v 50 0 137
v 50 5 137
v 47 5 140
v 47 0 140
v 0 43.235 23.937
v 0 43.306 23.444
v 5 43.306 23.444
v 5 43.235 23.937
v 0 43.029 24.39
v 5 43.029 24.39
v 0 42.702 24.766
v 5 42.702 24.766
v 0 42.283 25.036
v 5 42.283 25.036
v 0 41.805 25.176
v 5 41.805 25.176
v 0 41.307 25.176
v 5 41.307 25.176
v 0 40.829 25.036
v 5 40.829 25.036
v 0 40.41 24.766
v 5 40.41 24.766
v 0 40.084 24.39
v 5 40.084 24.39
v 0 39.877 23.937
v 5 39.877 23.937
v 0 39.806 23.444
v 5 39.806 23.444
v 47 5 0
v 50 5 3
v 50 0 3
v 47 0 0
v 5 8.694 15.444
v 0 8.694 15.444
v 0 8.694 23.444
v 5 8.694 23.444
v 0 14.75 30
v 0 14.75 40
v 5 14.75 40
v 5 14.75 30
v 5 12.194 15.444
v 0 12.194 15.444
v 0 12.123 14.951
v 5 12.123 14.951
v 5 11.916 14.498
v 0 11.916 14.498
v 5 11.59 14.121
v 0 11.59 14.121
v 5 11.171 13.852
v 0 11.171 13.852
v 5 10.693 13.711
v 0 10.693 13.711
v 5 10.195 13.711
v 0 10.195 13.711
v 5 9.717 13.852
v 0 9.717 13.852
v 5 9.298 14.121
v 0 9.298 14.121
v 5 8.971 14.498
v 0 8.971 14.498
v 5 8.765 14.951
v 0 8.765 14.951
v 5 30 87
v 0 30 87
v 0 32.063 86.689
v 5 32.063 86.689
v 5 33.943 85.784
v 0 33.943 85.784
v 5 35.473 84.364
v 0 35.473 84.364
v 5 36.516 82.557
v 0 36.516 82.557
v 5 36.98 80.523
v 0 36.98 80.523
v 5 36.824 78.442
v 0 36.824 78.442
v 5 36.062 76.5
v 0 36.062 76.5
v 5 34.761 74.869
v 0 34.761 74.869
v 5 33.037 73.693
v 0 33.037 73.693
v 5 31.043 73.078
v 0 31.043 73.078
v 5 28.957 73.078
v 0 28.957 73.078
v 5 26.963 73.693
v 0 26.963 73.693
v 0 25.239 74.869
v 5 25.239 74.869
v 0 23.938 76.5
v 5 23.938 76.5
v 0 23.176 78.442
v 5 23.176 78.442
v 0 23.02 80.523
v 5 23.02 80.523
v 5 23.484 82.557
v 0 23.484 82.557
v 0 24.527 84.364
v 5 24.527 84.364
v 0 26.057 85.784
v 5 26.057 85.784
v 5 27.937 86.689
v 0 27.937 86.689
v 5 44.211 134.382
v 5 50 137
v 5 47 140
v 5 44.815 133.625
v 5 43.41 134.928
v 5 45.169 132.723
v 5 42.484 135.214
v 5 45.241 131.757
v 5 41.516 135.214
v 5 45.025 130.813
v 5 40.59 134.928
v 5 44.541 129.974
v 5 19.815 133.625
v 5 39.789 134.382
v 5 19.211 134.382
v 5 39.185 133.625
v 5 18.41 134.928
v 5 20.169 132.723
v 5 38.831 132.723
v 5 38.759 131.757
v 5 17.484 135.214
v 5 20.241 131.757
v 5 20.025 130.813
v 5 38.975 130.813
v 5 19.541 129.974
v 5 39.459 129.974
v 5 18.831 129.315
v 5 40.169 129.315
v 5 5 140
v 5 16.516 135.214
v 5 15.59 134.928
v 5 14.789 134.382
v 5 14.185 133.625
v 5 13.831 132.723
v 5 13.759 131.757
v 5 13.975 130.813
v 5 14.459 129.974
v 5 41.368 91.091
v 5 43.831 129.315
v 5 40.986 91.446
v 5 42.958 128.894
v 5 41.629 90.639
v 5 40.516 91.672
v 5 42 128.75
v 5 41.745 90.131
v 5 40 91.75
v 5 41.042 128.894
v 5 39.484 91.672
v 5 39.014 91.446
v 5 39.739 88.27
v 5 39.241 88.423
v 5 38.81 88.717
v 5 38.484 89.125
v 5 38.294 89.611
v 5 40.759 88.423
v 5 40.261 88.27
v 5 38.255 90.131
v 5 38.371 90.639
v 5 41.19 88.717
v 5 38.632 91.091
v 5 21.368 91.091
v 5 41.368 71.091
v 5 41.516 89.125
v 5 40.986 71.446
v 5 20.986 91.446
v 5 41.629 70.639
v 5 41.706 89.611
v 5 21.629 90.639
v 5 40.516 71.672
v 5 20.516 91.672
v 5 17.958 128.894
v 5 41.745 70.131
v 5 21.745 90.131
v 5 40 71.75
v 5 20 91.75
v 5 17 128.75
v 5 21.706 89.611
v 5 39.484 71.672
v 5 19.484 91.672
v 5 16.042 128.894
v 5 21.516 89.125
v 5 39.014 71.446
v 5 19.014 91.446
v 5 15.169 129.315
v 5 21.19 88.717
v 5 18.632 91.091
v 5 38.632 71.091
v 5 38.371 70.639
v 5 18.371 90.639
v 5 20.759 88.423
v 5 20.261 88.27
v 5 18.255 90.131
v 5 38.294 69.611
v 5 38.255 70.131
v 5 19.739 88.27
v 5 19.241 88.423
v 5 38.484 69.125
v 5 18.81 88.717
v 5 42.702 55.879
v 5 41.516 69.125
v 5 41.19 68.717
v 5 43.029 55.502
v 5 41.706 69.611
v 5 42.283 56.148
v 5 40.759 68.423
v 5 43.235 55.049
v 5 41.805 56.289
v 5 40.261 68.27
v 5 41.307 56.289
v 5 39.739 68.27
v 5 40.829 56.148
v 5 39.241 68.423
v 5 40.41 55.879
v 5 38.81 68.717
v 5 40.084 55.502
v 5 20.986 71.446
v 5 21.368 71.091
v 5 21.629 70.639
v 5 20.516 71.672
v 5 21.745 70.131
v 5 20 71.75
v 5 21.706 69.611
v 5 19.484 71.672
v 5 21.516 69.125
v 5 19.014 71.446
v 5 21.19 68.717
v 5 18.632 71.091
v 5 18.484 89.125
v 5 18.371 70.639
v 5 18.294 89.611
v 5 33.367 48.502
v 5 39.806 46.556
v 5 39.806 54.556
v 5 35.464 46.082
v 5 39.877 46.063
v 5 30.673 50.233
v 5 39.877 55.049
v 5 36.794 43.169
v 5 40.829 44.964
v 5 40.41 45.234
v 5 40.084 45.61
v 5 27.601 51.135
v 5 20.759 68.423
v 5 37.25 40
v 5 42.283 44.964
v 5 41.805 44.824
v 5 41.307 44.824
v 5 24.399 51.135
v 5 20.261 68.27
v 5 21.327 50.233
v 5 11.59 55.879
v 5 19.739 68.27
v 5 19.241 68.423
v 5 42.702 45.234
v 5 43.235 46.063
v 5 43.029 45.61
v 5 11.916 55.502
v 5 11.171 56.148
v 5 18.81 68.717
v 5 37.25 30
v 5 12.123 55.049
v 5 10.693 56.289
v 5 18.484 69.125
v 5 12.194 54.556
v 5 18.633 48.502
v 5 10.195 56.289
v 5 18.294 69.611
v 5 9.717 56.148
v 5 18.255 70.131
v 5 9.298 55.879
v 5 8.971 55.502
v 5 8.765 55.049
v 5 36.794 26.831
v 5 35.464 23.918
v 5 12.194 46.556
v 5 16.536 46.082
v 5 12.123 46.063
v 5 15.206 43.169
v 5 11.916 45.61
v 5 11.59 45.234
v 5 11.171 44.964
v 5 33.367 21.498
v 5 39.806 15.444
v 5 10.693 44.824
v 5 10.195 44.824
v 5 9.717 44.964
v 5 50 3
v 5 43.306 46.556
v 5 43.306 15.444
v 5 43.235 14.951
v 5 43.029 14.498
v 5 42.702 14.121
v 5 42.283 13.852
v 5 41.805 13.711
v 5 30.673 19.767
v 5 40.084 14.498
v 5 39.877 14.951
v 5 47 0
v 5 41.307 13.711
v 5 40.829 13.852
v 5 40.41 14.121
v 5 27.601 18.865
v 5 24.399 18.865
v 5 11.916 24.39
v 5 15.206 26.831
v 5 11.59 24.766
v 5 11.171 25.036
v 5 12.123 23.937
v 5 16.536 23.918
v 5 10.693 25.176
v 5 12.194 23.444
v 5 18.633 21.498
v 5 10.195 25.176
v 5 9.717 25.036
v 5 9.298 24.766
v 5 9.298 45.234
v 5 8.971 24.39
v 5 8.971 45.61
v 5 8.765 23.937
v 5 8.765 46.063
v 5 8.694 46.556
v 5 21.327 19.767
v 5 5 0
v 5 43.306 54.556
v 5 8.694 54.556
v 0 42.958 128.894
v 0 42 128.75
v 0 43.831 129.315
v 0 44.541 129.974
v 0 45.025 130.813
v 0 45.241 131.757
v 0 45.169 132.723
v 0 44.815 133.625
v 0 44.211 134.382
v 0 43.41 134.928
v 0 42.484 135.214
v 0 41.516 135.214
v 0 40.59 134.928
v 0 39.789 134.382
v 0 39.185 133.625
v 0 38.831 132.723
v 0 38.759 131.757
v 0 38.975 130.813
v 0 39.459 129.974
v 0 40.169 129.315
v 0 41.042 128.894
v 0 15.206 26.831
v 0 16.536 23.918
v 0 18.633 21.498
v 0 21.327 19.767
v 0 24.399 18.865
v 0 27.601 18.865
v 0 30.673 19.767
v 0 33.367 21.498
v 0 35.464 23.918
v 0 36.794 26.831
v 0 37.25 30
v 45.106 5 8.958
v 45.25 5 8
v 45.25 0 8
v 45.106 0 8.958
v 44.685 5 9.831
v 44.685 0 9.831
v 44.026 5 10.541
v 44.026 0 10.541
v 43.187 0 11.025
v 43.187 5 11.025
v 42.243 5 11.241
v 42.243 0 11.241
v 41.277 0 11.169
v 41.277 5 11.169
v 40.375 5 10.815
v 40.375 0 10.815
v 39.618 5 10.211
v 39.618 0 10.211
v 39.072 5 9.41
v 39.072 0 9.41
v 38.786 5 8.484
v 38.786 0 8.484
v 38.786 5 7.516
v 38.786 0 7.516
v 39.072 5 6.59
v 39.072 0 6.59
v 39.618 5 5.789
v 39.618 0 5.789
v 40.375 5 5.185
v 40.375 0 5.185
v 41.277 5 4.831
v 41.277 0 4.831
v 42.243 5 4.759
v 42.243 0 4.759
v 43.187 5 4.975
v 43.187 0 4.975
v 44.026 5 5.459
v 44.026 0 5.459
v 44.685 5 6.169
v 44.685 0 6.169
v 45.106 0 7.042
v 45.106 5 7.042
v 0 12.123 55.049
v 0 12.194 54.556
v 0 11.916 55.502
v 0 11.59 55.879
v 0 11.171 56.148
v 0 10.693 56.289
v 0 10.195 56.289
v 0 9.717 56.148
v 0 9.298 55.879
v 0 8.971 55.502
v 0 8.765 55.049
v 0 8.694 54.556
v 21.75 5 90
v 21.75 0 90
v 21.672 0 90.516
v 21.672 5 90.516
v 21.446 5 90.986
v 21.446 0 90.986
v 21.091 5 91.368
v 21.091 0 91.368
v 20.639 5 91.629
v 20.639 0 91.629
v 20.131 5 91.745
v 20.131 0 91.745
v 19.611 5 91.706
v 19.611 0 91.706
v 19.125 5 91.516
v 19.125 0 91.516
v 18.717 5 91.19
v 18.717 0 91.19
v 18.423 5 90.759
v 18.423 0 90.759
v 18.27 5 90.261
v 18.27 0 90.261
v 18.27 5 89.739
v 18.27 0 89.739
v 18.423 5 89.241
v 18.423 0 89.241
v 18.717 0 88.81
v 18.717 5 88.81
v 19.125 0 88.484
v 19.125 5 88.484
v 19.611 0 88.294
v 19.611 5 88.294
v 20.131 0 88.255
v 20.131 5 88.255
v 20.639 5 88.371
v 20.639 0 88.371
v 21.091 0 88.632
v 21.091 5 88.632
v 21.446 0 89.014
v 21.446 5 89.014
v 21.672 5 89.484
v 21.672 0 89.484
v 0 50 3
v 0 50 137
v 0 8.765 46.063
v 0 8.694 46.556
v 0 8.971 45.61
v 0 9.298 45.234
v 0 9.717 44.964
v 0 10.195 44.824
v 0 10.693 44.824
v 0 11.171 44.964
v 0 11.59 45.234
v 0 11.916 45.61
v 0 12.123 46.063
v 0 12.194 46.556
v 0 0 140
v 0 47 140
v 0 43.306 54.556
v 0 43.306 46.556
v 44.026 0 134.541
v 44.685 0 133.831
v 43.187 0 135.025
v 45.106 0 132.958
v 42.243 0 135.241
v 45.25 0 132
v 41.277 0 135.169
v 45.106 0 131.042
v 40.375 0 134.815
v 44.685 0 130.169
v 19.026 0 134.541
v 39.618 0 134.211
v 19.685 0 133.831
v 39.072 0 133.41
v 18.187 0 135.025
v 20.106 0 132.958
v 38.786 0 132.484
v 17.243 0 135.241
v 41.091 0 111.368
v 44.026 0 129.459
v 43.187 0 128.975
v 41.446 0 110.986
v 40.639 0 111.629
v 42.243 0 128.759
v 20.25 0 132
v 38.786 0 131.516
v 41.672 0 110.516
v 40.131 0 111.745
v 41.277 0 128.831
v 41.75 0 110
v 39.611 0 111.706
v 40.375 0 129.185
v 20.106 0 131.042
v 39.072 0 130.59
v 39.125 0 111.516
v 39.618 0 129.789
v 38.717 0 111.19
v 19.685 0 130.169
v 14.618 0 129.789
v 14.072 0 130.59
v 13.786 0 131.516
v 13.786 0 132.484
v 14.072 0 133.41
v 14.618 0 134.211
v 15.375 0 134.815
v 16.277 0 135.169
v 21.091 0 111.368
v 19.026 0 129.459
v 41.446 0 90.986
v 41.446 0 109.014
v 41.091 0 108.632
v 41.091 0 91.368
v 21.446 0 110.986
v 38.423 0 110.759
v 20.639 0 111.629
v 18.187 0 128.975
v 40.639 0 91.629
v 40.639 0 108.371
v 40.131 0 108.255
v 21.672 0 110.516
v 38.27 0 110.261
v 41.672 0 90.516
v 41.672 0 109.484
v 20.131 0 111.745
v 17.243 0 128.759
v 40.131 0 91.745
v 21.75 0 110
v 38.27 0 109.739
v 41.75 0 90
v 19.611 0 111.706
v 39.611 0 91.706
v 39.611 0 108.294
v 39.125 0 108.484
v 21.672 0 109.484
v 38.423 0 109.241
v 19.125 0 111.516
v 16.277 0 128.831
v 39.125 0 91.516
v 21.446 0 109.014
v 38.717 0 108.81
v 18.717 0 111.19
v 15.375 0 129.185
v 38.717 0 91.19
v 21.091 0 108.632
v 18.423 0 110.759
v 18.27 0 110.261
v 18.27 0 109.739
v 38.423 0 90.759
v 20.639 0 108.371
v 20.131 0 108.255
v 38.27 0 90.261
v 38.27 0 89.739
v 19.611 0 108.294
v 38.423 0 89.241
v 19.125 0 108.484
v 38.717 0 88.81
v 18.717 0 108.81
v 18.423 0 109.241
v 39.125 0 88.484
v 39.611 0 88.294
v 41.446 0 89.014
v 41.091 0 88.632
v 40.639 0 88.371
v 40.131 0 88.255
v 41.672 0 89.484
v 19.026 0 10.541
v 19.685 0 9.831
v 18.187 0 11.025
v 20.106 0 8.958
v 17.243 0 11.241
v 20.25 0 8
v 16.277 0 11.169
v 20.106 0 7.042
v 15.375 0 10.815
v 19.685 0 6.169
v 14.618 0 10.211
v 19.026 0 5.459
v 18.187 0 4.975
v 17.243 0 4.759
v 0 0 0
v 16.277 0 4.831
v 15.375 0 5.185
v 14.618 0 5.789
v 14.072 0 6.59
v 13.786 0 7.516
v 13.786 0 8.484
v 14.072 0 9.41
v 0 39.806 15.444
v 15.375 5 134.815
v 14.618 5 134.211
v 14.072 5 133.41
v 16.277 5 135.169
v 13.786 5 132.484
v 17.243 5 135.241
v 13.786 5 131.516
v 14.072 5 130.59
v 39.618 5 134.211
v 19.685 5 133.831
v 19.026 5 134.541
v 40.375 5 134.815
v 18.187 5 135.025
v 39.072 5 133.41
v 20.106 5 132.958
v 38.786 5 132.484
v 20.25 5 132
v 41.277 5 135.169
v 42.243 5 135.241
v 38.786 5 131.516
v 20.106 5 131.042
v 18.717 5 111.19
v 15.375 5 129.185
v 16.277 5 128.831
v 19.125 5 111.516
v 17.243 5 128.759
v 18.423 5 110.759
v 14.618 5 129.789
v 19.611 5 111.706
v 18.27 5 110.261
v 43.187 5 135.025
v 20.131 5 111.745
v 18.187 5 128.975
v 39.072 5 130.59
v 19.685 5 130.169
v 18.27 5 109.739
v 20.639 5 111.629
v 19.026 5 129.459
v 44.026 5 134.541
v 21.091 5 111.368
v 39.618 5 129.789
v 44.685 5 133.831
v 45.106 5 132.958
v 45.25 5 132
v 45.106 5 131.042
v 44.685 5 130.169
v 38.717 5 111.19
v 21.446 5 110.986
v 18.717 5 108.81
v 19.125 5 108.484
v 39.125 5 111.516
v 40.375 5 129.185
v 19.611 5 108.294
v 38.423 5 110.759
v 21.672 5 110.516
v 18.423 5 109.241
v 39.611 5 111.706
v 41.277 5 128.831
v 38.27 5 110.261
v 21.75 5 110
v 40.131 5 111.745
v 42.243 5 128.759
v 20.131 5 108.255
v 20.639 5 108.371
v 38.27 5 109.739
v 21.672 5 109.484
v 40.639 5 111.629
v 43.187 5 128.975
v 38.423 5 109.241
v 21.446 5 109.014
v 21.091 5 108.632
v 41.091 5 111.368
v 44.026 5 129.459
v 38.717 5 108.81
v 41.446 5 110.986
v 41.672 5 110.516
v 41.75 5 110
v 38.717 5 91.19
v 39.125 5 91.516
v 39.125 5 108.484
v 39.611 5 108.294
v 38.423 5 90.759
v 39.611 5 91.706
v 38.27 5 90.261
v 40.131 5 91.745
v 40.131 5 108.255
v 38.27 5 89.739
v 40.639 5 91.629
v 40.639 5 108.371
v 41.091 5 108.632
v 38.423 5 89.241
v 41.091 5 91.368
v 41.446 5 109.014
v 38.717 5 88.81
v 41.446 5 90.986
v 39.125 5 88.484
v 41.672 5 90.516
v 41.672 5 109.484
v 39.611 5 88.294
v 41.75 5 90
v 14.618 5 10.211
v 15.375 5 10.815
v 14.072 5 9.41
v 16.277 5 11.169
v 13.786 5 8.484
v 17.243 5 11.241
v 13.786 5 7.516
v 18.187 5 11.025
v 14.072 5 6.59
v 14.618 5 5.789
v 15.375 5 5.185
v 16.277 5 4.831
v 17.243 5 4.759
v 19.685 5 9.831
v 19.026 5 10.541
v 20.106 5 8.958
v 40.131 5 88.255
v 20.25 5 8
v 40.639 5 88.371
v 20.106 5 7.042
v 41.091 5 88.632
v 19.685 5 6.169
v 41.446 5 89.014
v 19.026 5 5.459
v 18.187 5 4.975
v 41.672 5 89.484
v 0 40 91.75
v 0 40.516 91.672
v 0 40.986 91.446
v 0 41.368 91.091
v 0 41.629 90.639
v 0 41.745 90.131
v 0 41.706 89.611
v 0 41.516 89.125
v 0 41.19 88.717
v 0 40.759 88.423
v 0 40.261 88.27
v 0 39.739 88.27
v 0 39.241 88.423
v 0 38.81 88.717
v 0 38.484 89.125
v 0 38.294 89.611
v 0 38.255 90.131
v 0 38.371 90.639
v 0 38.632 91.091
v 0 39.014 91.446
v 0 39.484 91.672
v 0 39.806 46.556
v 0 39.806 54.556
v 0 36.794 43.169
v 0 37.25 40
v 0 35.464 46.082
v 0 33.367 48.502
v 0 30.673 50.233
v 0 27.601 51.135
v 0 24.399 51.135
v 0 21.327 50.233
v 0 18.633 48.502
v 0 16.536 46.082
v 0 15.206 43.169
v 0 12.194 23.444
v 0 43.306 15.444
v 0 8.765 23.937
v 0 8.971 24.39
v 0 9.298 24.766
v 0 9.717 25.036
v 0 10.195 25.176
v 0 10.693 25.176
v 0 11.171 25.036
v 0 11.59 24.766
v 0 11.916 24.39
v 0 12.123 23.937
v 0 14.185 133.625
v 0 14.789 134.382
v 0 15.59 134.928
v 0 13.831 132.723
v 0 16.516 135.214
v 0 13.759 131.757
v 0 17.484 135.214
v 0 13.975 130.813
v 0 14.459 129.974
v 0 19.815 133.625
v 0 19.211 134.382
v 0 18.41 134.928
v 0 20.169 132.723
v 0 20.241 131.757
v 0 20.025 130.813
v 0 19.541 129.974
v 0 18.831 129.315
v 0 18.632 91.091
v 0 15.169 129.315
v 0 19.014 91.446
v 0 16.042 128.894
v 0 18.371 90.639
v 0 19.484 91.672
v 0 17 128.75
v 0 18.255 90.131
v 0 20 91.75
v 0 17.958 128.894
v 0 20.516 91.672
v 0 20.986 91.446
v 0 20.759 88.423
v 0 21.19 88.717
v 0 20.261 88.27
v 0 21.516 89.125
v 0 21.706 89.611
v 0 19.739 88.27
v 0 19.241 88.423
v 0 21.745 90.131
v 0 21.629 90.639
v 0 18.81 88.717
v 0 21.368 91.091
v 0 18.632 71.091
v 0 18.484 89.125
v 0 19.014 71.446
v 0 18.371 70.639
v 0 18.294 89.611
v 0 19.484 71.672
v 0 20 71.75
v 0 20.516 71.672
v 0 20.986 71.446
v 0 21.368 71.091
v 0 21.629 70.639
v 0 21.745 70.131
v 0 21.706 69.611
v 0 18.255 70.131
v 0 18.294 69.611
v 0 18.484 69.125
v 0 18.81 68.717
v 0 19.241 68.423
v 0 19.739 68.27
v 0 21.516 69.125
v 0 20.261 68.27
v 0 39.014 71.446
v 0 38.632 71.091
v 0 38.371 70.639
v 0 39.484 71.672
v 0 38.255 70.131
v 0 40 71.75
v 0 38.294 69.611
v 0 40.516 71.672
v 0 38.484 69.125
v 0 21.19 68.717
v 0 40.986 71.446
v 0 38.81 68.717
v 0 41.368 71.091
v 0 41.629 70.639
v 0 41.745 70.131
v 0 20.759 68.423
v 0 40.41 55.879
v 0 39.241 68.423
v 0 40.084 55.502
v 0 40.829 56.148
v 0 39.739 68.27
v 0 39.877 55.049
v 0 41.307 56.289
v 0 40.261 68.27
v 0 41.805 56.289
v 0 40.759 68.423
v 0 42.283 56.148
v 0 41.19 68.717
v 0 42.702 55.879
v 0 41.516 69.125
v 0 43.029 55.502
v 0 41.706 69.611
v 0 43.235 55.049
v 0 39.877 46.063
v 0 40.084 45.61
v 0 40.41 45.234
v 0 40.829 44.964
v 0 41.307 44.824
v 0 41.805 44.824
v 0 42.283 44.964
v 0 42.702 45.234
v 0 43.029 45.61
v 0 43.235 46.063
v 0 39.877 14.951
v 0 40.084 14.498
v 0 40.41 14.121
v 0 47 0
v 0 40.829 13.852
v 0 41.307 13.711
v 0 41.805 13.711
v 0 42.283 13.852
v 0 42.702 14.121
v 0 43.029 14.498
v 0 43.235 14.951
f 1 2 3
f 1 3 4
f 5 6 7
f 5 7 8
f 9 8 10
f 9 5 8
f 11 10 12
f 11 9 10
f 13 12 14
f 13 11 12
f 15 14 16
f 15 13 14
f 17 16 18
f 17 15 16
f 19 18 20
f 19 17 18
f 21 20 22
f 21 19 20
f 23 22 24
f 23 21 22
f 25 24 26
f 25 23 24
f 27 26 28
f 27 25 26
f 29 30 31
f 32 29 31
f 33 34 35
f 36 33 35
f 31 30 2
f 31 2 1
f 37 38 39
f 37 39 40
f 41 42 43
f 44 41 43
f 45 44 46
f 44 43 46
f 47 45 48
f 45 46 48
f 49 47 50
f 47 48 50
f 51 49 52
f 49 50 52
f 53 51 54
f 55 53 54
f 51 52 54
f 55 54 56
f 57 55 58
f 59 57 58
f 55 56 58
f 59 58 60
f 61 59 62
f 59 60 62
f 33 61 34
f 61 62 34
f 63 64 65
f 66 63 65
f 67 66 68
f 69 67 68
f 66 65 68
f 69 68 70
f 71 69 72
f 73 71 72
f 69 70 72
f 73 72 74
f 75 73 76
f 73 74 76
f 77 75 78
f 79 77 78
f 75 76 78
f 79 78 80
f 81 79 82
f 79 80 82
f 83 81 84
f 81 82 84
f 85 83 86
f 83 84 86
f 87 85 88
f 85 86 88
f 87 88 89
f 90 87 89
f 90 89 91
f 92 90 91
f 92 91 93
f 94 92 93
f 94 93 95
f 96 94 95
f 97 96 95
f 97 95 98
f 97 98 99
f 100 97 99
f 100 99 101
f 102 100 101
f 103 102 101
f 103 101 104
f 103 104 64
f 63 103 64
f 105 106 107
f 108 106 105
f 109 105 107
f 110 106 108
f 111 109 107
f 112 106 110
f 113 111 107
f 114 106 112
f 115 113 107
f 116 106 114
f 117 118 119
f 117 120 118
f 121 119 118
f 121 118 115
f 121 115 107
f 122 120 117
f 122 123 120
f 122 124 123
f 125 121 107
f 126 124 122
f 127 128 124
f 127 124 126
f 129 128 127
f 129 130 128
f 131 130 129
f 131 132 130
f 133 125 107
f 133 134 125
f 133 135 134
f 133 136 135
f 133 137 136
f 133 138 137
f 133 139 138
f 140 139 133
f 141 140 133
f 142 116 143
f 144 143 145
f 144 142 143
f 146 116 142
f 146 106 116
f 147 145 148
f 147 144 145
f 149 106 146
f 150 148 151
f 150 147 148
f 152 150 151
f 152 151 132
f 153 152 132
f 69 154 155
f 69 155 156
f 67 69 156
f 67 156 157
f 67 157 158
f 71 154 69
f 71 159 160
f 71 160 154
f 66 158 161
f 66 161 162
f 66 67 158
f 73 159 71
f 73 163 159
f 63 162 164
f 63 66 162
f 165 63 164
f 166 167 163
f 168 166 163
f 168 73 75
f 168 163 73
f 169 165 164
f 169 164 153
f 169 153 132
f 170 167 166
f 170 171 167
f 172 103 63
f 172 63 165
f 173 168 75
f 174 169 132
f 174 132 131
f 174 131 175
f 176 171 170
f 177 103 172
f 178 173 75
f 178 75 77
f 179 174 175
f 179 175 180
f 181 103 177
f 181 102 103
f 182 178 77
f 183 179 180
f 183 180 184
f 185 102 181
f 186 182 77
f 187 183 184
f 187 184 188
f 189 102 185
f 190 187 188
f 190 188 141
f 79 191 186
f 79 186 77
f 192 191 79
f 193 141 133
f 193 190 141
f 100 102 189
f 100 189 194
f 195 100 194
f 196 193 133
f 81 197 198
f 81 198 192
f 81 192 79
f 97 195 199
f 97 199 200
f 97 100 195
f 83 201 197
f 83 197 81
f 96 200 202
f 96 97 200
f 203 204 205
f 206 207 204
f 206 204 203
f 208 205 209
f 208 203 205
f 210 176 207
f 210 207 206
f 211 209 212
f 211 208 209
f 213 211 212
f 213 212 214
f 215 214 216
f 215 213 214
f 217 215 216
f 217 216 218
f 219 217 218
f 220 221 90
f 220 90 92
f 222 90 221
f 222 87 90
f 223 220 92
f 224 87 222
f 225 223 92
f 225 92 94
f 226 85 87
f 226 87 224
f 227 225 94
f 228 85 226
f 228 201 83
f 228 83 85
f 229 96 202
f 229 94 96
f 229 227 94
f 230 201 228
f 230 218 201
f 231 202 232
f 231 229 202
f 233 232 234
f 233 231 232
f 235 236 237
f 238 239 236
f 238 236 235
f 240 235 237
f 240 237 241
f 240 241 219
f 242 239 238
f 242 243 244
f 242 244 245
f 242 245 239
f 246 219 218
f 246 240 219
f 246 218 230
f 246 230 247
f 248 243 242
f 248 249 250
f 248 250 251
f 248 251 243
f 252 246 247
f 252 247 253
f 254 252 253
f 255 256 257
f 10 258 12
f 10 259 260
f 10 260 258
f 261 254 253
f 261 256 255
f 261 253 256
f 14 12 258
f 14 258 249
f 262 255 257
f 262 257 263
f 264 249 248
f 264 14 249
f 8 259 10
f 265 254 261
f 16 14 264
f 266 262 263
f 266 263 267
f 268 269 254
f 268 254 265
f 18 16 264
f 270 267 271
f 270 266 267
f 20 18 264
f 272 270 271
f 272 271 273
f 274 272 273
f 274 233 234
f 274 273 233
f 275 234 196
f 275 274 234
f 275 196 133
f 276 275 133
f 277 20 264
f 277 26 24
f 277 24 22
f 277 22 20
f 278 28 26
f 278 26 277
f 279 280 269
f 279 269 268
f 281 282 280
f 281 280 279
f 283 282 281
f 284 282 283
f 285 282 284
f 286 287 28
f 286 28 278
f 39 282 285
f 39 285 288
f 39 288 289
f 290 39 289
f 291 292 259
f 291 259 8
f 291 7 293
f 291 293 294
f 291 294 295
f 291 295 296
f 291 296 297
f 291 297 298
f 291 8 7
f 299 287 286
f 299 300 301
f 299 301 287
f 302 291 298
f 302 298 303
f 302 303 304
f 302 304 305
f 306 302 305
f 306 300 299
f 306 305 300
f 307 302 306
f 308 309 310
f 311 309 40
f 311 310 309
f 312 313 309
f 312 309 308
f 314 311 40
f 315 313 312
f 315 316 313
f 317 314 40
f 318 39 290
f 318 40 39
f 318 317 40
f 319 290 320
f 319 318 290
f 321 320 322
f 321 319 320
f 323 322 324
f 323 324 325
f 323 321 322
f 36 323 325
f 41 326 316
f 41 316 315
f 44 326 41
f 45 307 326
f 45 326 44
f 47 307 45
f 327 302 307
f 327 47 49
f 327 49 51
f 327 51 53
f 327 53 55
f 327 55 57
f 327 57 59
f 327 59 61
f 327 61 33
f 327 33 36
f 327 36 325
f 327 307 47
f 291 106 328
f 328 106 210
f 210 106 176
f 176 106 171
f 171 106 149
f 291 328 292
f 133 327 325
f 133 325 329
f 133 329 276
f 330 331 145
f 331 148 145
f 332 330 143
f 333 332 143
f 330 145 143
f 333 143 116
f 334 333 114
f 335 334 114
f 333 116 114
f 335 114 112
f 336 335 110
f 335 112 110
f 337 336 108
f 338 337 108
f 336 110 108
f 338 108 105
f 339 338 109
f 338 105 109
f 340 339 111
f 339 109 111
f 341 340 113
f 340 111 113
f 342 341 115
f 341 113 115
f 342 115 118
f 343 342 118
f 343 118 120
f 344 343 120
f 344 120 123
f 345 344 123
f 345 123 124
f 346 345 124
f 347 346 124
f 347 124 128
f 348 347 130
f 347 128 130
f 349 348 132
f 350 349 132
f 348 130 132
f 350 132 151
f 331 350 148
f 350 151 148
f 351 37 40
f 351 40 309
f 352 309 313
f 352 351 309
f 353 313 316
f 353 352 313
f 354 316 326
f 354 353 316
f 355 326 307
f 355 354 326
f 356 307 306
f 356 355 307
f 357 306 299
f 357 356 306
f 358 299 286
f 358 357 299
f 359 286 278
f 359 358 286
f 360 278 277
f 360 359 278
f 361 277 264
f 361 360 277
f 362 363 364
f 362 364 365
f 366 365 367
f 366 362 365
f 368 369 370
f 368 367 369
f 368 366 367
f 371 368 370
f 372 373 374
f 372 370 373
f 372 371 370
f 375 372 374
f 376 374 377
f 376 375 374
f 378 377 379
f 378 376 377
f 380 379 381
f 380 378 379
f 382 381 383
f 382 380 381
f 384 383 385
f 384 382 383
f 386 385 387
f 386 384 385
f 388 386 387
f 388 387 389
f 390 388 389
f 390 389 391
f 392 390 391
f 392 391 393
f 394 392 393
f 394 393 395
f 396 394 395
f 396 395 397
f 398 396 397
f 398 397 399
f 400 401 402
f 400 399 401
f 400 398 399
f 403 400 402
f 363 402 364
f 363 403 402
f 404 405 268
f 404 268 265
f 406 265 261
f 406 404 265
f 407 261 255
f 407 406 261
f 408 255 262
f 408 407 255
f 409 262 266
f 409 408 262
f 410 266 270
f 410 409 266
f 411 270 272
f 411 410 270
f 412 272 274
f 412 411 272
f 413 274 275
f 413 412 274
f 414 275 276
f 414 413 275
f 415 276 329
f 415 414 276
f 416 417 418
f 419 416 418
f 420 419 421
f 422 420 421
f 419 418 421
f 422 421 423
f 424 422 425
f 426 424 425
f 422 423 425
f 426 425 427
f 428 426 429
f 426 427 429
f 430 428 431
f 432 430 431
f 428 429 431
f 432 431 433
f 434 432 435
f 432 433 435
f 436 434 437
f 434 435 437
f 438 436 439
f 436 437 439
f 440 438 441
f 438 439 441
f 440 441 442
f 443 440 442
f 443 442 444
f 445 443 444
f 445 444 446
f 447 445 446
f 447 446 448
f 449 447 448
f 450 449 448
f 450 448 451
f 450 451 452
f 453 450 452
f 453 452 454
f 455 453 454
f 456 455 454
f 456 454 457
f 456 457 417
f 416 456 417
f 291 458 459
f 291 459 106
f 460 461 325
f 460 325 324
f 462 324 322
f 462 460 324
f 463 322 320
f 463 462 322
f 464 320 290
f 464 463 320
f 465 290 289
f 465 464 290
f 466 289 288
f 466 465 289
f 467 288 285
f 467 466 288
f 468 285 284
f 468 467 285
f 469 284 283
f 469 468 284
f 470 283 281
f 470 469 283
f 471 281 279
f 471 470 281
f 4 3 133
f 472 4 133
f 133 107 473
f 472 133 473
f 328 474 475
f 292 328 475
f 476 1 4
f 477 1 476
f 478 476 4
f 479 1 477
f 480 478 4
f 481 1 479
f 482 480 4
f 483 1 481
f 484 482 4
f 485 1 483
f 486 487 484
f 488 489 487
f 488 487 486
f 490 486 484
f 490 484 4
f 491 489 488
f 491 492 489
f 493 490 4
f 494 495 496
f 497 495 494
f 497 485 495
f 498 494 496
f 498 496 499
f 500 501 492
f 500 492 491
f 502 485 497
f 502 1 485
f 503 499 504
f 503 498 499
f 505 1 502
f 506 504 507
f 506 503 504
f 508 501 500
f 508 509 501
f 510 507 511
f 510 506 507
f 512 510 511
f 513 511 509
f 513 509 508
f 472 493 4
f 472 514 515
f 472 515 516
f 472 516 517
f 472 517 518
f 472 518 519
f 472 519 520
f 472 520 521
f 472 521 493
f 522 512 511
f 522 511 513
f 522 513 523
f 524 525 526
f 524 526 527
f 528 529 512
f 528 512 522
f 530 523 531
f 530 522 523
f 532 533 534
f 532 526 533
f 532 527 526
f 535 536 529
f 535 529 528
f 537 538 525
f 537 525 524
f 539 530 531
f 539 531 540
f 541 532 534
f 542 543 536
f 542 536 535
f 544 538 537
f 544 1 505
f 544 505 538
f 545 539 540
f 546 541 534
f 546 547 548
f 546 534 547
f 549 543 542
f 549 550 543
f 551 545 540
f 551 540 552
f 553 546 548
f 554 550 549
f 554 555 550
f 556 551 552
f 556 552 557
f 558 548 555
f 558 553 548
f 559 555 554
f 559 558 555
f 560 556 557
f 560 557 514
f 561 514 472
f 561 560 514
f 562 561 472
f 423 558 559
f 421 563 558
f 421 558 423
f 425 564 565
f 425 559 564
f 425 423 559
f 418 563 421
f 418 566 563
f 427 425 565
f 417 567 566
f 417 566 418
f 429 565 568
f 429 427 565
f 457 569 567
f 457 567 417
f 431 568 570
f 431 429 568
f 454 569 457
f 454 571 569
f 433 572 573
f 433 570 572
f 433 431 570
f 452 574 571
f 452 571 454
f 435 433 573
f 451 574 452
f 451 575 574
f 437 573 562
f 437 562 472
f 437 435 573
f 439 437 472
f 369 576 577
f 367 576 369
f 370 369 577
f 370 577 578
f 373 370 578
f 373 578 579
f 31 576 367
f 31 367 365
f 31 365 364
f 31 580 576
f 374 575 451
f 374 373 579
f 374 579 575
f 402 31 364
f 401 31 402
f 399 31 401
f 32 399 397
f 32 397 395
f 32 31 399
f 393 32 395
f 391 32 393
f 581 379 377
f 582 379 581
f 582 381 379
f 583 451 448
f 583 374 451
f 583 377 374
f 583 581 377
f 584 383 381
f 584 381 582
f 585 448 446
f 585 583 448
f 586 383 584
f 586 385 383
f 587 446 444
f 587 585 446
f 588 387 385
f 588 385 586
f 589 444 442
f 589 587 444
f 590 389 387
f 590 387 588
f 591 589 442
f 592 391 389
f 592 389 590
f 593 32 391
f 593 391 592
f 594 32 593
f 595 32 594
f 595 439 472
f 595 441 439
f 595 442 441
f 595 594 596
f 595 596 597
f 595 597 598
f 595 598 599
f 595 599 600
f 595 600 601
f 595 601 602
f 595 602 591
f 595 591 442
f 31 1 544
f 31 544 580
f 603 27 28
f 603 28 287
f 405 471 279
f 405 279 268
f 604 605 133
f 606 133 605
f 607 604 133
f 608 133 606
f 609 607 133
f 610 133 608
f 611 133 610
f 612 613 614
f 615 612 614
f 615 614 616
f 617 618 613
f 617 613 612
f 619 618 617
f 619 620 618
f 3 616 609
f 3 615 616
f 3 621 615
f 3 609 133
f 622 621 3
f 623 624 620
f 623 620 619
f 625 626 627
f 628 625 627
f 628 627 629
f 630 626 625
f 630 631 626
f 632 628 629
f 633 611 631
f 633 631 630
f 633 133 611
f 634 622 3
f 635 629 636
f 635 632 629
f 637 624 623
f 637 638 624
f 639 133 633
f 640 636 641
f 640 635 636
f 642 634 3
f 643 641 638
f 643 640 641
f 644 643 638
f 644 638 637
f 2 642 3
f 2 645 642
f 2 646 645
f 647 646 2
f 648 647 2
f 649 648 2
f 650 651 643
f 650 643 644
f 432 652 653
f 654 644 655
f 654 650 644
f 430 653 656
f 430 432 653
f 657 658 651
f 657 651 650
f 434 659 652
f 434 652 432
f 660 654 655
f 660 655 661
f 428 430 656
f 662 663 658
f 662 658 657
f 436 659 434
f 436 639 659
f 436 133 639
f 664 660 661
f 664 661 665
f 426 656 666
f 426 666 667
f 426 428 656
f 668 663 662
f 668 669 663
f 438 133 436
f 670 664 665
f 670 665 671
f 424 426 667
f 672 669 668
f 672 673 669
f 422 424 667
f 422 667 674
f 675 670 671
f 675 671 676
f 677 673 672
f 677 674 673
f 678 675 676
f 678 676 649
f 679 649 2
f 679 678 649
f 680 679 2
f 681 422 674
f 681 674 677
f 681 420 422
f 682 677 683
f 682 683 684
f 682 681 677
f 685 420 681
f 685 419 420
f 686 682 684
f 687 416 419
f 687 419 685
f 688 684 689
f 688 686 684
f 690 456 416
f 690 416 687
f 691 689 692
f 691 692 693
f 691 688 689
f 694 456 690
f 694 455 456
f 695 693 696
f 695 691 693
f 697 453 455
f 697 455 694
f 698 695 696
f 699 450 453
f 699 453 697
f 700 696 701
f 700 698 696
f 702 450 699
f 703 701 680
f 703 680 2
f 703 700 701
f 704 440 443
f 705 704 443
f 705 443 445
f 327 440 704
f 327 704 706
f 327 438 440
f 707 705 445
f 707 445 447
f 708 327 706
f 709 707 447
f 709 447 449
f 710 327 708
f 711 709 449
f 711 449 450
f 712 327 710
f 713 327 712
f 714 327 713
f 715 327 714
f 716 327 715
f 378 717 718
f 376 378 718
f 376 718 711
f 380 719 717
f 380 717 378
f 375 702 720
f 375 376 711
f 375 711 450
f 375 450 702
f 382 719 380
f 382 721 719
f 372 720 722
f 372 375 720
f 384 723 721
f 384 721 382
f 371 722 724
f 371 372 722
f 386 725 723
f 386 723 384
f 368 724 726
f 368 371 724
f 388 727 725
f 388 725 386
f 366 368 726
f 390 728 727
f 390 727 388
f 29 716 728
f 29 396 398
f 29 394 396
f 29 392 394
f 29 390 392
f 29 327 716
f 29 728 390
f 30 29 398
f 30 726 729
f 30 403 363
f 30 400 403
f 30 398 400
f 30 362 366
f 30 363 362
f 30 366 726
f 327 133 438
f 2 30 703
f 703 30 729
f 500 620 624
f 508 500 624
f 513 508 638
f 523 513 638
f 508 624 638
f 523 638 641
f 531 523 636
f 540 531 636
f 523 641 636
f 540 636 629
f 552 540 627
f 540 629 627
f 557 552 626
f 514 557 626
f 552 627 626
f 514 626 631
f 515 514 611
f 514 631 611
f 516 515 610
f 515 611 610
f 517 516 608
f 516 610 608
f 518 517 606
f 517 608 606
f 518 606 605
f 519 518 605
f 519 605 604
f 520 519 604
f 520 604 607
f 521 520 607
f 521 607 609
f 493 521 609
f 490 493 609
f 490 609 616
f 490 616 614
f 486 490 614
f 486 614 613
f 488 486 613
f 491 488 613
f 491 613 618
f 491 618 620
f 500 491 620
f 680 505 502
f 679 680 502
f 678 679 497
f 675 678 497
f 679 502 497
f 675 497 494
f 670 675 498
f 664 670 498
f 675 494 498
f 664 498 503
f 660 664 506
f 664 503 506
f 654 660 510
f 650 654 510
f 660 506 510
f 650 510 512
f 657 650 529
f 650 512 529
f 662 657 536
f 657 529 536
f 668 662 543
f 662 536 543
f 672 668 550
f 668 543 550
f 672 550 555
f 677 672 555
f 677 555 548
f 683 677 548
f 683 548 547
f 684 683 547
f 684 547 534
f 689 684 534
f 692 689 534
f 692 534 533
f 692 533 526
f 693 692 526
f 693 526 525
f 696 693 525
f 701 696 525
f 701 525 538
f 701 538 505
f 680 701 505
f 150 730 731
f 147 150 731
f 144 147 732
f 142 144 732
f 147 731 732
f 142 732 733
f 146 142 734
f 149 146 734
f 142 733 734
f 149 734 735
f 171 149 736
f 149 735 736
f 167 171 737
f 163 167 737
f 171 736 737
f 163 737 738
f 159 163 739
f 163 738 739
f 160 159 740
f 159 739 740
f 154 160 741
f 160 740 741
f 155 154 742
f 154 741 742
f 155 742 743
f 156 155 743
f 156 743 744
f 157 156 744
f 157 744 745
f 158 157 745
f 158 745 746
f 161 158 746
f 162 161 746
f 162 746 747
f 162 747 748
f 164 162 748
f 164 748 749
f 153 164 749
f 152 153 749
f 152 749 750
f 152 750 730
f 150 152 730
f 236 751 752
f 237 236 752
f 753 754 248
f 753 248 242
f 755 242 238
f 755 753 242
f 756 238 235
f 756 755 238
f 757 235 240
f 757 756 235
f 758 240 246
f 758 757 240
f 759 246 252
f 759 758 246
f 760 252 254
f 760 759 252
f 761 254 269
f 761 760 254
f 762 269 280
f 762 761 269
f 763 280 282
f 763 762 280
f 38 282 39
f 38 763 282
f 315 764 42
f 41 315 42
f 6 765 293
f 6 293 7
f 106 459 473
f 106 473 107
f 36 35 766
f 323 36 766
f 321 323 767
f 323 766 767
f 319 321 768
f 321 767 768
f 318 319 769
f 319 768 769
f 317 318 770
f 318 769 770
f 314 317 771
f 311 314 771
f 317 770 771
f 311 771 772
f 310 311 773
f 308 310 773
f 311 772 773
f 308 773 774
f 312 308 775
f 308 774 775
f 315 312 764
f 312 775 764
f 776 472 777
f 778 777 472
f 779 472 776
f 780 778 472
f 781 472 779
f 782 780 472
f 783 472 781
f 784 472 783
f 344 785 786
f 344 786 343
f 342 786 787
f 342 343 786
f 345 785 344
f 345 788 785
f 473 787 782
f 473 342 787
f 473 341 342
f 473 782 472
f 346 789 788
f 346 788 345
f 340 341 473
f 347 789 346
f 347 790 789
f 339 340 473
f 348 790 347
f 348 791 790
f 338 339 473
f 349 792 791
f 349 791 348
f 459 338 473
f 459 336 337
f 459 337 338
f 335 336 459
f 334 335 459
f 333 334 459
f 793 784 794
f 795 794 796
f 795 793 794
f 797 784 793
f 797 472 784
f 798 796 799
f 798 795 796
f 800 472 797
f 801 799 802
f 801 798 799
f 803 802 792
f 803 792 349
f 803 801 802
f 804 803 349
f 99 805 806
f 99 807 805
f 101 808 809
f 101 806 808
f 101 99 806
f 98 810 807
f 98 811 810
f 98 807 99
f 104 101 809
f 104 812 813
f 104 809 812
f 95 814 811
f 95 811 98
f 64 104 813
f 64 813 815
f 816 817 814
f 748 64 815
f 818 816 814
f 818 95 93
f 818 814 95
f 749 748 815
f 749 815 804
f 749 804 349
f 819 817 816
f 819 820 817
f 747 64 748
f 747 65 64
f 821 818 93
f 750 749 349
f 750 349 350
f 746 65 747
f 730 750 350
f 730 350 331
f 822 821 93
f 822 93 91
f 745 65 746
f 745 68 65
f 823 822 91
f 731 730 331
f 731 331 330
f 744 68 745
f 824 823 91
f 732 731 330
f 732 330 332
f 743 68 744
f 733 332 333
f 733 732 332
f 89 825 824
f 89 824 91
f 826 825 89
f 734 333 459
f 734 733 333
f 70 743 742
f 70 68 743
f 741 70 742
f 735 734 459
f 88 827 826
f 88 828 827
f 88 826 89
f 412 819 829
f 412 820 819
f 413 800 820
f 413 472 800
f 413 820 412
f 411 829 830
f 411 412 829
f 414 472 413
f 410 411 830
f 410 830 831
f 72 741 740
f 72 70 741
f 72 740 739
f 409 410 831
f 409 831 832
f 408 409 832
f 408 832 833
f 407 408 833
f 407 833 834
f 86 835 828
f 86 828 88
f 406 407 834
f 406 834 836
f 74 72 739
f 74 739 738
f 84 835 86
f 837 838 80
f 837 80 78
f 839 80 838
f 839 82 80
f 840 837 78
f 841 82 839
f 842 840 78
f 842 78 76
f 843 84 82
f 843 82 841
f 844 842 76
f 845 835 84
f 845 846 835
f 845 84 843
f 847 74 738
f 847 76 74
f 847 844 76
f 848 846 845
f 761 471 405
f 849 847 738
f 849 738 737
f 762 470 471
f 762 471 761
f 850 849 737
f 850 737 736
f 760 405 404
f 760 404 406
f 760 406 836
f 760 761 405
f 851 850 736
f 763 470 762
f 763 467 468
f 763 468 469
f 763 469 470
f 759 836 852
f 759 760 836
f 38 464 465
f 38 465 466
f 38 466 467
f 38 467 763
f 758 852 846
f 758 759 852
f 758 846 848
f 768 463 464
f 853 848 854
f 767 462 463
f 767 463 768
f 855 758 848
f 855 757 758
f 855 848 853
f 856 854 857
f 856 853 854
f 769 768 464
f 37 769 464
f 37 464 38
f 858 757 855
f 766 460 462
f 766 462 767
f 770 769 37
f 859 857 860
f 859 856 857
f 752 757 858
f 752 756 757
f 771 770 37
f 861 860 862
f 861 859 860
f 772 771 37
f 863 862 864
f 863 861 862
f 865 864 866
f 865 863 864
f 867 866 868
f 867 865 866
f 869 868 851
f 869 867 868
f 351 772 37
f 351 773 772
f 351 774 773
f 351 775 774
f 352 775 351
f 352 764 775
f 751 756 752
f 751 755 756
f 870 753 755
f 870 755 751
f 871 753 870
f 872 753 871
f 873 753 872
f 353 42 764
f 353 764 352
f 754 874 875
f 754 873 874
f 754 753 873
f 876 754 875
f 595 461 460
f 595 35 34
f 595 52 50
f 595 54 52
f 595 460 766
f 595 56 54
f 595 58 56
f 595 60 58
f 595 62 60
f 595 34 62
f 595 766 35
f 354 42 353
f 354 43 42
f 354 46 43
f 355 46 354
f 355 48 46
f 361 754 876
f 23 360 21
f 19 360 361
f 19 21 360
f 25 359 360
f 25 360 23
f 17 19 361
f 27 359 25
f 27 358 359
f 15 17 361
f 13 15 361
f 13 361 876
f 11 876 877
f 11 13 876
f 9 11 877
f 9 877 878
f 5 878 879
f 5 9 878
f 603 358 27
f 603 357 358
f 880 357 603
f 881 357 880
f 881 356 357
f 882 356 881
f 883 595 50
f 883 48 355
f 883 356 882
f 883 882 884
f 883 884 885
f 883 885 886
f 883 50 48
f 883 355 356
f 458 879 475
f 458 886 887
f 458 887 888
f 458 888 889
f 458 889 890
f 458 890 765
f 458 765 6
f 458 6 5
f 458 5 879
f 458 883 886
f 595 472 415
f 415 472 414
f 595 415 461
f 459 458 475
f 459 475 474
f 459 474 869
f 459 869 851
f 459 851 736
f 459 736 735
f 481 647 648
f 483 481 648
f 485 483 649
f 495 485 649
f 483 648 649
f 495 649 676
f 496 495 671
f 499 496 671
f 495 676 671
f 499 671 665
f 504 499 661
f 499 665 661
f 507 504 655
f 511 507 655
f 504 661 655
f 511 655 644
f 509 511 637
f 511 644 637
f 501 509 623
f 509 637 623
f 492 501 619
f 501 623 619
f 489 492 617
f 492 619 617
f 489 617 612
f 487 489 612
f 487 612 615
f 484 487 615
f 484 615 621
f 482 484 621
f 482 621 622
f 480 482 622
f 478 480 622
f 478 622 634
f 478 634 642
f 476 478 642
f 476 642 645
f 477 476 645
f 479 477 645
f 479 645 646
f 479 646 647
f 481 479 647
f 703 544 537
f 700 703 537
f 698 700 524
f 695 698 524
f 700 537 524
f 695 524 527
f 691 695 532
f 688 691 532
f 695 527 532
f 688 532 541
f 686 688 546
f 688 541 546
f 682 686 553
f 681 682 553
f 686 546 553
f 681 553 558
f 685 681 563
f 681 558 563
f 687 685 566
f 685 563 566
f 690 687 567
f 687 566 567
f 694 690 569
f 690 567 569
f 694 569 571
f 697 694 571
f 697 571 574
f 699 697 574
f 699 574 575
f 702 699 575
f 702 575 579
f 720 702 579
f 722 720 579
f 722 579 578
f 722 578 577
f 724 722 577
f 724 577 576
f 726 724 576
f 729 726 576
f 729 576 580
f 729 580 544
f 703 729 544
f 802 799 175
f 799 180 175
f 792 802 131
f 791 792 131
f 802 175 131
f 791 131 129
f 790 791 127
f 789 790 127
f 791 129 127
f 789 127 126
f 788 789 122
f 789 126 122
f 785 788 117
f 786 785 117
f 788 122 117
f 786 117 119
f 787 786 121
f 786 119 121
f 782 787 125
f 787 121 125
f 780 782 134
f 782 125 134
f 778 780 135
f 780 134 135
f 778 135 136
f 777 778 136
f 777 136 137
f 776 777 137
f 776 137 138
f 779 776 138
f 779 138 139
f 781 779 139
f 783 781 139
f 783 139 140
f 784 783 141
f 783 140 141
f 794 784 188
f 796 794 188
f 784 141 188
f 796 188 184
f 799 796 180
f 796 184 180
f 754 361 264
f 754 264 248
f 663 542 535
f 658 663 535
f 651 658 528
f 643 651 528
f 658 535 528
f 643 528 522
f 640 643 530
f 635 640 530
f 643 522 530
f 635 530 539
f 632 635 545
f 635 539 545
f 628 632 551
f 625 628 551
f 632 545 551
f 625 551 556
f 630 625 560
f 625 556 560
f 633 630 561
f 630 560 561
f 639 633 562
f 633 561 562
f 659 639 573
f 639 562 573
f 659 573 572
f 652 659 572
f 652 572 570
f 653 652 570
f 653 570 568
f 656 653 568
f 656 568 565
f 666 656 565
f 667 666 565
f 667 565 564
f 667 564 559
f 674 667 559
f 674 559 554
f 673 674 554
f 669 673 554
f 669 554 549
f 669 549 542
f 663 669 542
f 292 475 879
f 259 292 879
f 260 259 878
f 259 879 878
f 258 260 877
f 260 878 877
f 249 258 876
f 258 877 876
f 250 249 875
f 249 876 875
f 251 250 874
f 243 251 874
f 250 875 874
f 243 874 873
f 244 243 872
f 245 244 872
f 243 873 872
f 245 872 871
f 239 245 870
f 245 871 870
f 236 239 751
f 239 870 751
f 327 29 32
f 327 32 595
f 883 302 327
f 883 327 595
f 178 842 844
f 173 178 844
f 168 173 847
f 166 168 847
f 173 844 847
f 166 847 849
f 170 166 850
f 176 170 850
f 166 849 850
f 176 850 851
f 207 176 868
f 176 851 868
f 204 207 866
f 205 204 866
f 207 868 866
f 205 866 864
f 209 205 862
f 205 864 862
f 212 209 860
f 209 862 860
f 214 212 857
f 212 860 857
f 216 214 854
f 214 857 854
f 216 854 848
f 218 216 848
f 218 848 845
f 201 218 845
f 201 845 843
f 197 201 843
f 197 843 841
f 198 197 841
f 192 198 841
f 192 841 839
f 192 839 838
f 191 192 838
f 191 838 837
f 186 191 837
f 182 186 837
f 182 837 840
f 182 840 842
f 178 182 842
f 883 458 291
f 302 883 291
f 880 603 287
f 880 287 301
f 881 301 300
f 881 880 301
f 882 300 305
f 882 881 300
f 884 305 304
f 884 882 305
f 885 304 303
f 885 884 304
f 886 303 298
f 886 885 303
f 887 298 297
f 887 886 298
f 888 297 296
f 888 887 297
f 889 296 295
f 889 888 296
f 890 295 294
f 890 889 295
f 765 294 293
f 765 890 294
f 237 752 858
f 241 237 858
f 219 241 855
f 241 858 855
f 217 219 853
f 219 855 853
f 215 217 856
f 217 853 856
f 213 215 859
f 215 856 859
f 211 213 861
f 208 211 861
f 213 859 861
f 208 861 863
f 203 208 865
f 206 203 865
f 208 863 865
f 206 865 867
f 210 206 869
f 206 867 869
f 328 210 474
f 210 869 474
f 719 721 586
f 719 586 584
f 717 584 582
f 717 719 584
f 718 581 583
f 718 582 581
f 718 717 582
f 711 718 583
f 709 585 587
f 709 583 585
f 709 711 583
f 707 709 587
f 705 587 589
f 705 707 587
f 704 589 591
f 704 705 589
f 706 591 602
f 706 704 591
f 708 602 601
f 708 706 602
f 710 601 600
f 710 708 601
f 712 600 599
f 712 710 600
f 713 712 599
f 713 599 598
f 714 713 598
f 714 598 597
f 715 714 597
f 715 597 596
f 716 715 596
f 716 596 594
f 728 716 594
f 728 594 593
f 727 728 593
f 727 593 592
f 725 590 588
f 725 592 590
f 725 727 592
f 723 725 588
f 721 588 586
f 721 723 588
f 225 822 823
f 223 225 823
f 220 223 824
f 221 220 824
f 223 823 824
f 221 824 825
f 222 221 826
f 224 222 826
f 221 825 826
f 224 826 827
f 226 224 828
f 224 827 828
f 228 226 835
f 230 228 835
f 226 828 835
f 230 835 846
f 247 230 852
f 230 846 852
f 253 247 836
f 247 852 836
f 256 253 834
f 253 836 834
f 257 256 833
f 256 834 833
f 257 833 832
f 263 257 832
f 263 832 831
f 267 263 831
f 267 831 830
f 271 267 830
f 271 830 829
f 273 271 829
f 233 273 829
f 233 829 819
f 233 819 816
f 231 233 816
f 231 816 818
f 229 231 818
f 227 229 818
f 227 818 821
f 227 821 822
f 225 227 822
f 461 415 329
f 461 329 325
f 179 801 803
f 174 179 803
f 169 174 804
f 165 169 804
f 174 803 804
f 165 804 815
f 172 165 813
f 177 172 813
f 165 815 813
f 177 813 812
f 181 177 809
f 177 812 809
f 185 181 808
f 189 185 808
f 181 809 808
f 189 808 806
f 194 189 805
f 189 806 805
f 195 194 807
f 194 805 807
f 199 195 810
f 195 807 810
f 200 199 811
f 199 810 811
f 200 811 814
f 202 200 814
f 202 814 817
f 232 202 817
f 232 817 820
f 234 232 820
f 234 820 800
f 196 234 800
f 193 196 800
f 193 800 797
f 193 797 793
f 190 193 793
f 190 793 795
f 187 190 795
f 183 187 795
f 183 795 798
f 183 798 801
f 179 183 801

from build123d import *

# Parameters (mm, degrees)
ESTRUSIONE_ESTRUSIONE1_DEPTH = 140
FORO_6_5_6_5_1_D             = 6.5
FORO_6_5_6_5_2_D             = 6.5
FORO_6_5_6_5_2_DEPTH         = 5
FORO_6_5_6_5_2_TIP           = 1.952797012
TAGLIO_ESTRUSIONE3_REACH     = 158.844
SCHIZZO10_R                  = 1.75
SCHIZZO10_R_2                = 7
TAGLIO_ESTRUSIONE4_REACH     = 158.844
SCHIZZO11_R                  = 1.75
TAGLIO_ESTRUSIONE6_REACH     = 158.844
SMUSSO1_SIZE                 = 3


with BuildPart() as part:
    # Schizzo1 → Estrusione-Estrusione1 (new body)
    with BuildSketch(Plane.XY):
        Polygon((0, 0), (0, 50), (5, 50), (5, 5), (50, 5), (50, 0), align=None)
    extrude(amount=ESTRUSIONE_ESTRUSIONE1_DEPTH)

    # Foro Ø6.5 (6.5)-1 (through all)
    with Locations(Plane(origin=(0, 0, 0), x_dir=(-1, 0, 0), z_dir=(0, -1, 0))):
        with Locations((-17, -132), (-42, -132)):
            foro_6_5_6_5_1 = Hole(FORO_6_5_6_5_1_D / 2)

    # Foro Ø6.5 (6.5)-2
    with Locations(Plane.ZY):
        with Locations((132, 42), (132, 17)):
            Hole(FORO_6_5_6_5_2_D / 2, depth=FORO_6_5_6_5_2_DEPTH)
            with Locations((0, 0, -(FORO_6_5_6_5_2_DEPTH + FORO_6_5_6_5_2_TIP / 2))):  # 118° drill point
                Cone(0, FORO_6_5_6_5_2_D / 2, FORO_6_5_6_5_2_TIP, mode=Mode.SUBTRACT)

    # Specchia1: Foro Ø6.5 (6.5)-1 across plane
    add(foro_6_5_6_5_1.mirror(Plane.XY.offset(70)), mode=Mode.SUBTRACT)

    # Schizzo10 → Taglio-Estrusione3 (cut, up to next)
    with BuildSketch(Plane.ZY, mode=Mode.PRIVATE) as taglio_estrusione3_sk1:
        with Locations((70, 40)):
            Circle(SCHIZZO10_R)
    taglio_estrusione3_tool1 = extrude(taglio_estrusione3_sk1.sketch, amount=-TAGLIO_ESTRUSIONE3_REACH, mode=Mode.PRIVATE) & part.part
    # Schizzo10 → Taglio-Estrusione3 (cut, up to next)
    with BuildSketch(Plane.ZY, mode=Mode.PRIVATE) as taglio_estrusione3_sk2:
        with Locations((90, 40)):
            Circle(SCHIZZO10_R)
    taglio_estrusione3_tool2 = extrude(taglio_estrusione3_sk2.sketch, amount=-TAGLIO_ESTRUSIONE3_REACH, mode=Mode.PRIVATE) & part.part
    # Schizzo10 → Taglio-Estrusione3 (cut, up to next)
    with BuildSketch(Plane.ZY, mode=Mode.PRIVATE) as taglio_estrusione3_sk3:
        with Locations((90, 20)):
            Circle(SCHIZZO10_R)
    taglio_estrusione3_tool3 = extrude(taglio_estrusione3_sk3.sketch, amount=-TAGLIO_ESTRUSIONE3_REACH, mode=Mode.PRIVATE) & part.part
    # Schizzo10 → Taglio-Estrusione3 (cut, up to next)
    with BuildSketch(Plane.ZY, mode=Mode.PRIVATE) as taglio_estrusione3_sk4:
        with Locations((70, 20)):
            Circle(SCHIZZO10_R)
    taglio_estrusione3_tool4 = extrude(taglio_estrusione3_sk4.sketch, amount=-TAGLIO_ESTRUSIONE3_REACH, mode=Mode.PRIVATE) & part.part
    # Schizzo10 → Taglio-Estrusione3 (cut, up to next)
    with BuildSketch(Plane.ZY, mode=Mode.PRIVATE) as taglio_estrusione3_sk5:
        with Locations((80, 30)):
            Circle(SCHIZZO10_R_2)
    taglio_estrusione3_tool5 = extrude(taglio_estrusione3_sk5.sketch, amount=-TAGLIO_ESTRUSIONE3_REACH, mode=Mode.PRIVATE) & part.part
    add(taglio_estrusione3_tool1.solids().sort_by_distance((0, 40, 70))[0], mode=Mode.SUBTRACT)
    add(taglio_estrusione3_tool2.solids().sort_by_distance((0, 40, 90))[0], mode=Mode.SUBTRACT)
    add(taglio_estrusione3_tool3.solids().sort_by_distance((0, 20, 90))[0], mode=Mode.SUBTRACT)
    add(taglio_estrusione3_tool4.solids().sort_by_distance((0, 20, 70))[0], mode=Mode.SUBTRACT)
    add(taglio_estrusione3_tool5.solids().sort_by_distance((0, 30, 80))[0], mode=Mode.SUBTRACT)

    # Schizzo11 → Taglio-Estrusione4 (cut, up to next)
    with BuildSketch(Plane.XZ, mode=Mode.PRIVATE) as taglio_estrusione4_sk1:
        with Locations((20, 90)):
            Circle(SCHIZZO11_R)
    taglio_estrusione4_tool1 = extrude(taglio_estrusione4_sk1.sketch, amount=-TAGLIO_ESTRUSIONE4_REACH, mode=Mode.PRIVATE) & part.part
    # Schizzo11 → Taglio-Estrusione4 (cut, up to next)
    with BuildSketch(Plane.XZ, mode=Mode.PRIVATE) as taglio_estrusione4_sk2:
        with Locations((20, 110)):
            Circle(SCHIZZO11_R)
    taglio_estrusione4_tool2 = extrude(taglio_estrusione4_sk2.sketch, amount=-TAGLIO_ESTRUSIONE4_REACH, mode=Mode.PRIVATE) & part.part
    # Schizzo11 → Taglio-Estrusione4 (cut, up to next)
    with BuildSketch(Plane.XZ, mode=Mode.PRIVATE) as taglio_estrusione4_sk3:
        with Locations((40, 110)):
            Circle(SCHIZZO11_R)
    taglio_estrusione4_tool3 = extrude(taglio_estrusione4_sk3.sketch, amount=-TAGLIO_ESTRUSIONE4_REACH, mode=Mode.PRIVATE) & part.part
    # Schizzo11 → Taglio-Estrusione4 (cut, up to next)
    with BuildSketch(Plane.XZ, mode=Mode.PRIVATE) as taglio_estrusione4_sk4:
        with Locations((40, 90)):
            Circle(SCHIZZO11_R)
    taglio_estrusione4_tool4 = extrude(taglio_estrusione4_sk4.sketch, amount=-TAGLIO_ESTRUSIONE4_REACH, mode=Mode.PRIVATE) & part.part
    add(taglio_estrusione4_tool1.solids().sort_by_distance((20, 0, 90))[0], mode=Mode.SUBTRACT)
    add(taglio_estrusione4_tool2.solids().sort_by_distance((20, 0, 110))[0], mode=Mode.SUBTRACT)
    add(taglio_estrusione4_tool3.solids().sort_by_distance((40, 0, 110))[0], mode=Mode.SUBTRACT)
    add(taglio_estrusione4_tool4.solids().sort_by_distance((40, 0, 90))[0], mode=Mode.SUBTRACT)

    # Schizzo13 → Taglio-Estrusione6 (cut, up to next)
    with BuildSketch(Plane.ZY, mode=Mode.PRIVATE) as taglio_estrusione6_sk1:
        with BuildLine():
            Line((15.443650814, 43.306349186), (23.443650814, 43.306349186))
            ThreePointArc((23.443650814, 43.306349186), (25.193650814, 41.556349186), (23.443650814, 39.806349186))
            Line((23.443650814, 39.806349186), (15.443650814, 39.806349186))
            ThreePointArc((15.443650814, 39.806349186), (13.693650814, 41.556349186), (15.443650814, 43.306349186))
        make_face()
    taglio_estrusione6_tool1 = extrude(taglio_estrusione6_sk1.sketch, amount=-TAGLIO_ESTRUSIONE6_REACH, mode=Mode.PRIVATE) & part.part
    # Schizzo13 → Taglio-Estrusione6 (cut, up to next)
    with BuildSketch(Plane.ZY, mode=Mode.PRIVATE) as taglio_estrusione6_sk2:
        with BuildLine():
            Line((15.443650814, 8.693650814), (23.443650814, 8.693650814))
            ThreePointArc((23.443650814, 8.693650814), (25.193650814, 10.443650814), (23.443650814, 12.193650814))
            Line((23.443650814, 12.193650814), (15.443650814, 12.193650814))
            ThreePointArc((15.443650814, 12.193650814), (13.693650814, 10.443650814), (15.443650814, 8.693650814))
        make_face()
    taglio_estrusione6_tool2 = extrude(taglio_estrusione6_sk2.sketch, amount=-TAGLIO_ESTRUSIONE6_REACH, mode=Mode.PRIVATE) & part.part
    # Schizzo13 → Taglio-Estrusione6 (cut, up to next)
    with BuildSketch(Plane.ZY, mode=Mode.PRIVATE) as taglio_estrusione6_sk3:
        with BuildLine():
            Line((54.556349186, 43.306349186), (46.556349186, 43.306349186))
            ThreePointArc((46.556349186, 43.306349186), (44.806349186, 41.556349186), (46.556349186, 39.806349186))
            Line((46.556349186, 39.806349186), (54.556349186, 39.806349186))
            ThreePointArc((54.556349186, 39.806349186), (56.306349186, 41.556349186), (54.556349186, 43.306349186))
        make_face()
    taglio_estrusione6_tool3 = extrude(taglio_estrusione6_sk3.sketch, amount=-TAGLIO_ESTRUSIONE6_REACH, mode=Mode.PRIVATE) & part.part
    # Schizzo13 → Taglio-Estrusione6 (cut, up to next)
    with BuildSketch(Plane.ZY, mode=Mode.PRIVATE) as taglio_estrusione6_sk4:
        with BuildLine():
            Line((54.556349186, 8.693650814), (46.556349186, 8.693650814))
            ThreePointArc((46.556349186, 8.693650814), (44.806349186, 10.443650814), (46.556349186, 12.193650814))
            Line((46.556349186, 12.193650814), (54.556349186, 12.193650814))
            ThreePointArc((54.556349186, 12.193650814), (56.306349186, 10.443650814), (54.556349186, 8.693650814))
        make_face()
    taglio_estrusione6_tool4 = extrude(taglio_estrusione6_sk4.sketch, amount=-TAGLIO_ESTRUSIONE6_REACH, mode=Mode.PRIVATE) & part.part
    # Schizzo13 → Taglio-Estrusione6 (cut, up to next)
    with BuildSketch(Plane.ZY, mode=Mode.PRIVATE) as taglio_estrusione6_sk5:
        with BuildLine():
            Line((40, 14.75), (30, 14.75))
            ThreePointArc((30, 14.75), (18.75, 26), (30, 37.25))
            Line((30, 37.25), (40, 37.25))
            ThreePointArc((40, 37.25), (51.25, 26), (40, 14.75))
        make_face()
    taglio_estrusione6_tool5 = extrude(taglio_estrusione6_sk5.sketch, amount=-TAGLIO_ESTRUSIONE6_REACH, mode=Mode.PRIVATE) & part.part
    add(taglio_estrusione6_tool1.solids().sort_by_distance((0, 41.556349, 19.443651))[0], mode=Mode.SUBTRACT)
    add(taglio_estrusione6_tool2.solids().sort_by_distance((0, 10.443651, 19.443651))[0], mode=Mode.SUBTRACT)
    add(taglio_estrusione6_tool3.solids().sort_by_distance((0, 41.556349, 50.556349))[0], mode=Mode.SUBTRACT)
    add(taglio_estrusione6_tool4.solids().sort_by_distance((0, 10.443651, 50.556349))[0], mode=Mode.SUBTRACT)
    add(taglio_estrusione6_tool5.solids().sort_by_distance((0, 26, 35))[0], mode=Mode.SUBTRACT)

    # Smusso1
    smusso1_edges = [part.edges().sort_by_distance(p)[0] for p in [
        (2.5, 50, 140),
        (2.5, 50, 0),
        (50, 2.5, 140),
        (50, 2.5, 0),
    ]]
    chamfer(smusso1_edges, length=SMUSSO1_SIZE)


solid = part.part
